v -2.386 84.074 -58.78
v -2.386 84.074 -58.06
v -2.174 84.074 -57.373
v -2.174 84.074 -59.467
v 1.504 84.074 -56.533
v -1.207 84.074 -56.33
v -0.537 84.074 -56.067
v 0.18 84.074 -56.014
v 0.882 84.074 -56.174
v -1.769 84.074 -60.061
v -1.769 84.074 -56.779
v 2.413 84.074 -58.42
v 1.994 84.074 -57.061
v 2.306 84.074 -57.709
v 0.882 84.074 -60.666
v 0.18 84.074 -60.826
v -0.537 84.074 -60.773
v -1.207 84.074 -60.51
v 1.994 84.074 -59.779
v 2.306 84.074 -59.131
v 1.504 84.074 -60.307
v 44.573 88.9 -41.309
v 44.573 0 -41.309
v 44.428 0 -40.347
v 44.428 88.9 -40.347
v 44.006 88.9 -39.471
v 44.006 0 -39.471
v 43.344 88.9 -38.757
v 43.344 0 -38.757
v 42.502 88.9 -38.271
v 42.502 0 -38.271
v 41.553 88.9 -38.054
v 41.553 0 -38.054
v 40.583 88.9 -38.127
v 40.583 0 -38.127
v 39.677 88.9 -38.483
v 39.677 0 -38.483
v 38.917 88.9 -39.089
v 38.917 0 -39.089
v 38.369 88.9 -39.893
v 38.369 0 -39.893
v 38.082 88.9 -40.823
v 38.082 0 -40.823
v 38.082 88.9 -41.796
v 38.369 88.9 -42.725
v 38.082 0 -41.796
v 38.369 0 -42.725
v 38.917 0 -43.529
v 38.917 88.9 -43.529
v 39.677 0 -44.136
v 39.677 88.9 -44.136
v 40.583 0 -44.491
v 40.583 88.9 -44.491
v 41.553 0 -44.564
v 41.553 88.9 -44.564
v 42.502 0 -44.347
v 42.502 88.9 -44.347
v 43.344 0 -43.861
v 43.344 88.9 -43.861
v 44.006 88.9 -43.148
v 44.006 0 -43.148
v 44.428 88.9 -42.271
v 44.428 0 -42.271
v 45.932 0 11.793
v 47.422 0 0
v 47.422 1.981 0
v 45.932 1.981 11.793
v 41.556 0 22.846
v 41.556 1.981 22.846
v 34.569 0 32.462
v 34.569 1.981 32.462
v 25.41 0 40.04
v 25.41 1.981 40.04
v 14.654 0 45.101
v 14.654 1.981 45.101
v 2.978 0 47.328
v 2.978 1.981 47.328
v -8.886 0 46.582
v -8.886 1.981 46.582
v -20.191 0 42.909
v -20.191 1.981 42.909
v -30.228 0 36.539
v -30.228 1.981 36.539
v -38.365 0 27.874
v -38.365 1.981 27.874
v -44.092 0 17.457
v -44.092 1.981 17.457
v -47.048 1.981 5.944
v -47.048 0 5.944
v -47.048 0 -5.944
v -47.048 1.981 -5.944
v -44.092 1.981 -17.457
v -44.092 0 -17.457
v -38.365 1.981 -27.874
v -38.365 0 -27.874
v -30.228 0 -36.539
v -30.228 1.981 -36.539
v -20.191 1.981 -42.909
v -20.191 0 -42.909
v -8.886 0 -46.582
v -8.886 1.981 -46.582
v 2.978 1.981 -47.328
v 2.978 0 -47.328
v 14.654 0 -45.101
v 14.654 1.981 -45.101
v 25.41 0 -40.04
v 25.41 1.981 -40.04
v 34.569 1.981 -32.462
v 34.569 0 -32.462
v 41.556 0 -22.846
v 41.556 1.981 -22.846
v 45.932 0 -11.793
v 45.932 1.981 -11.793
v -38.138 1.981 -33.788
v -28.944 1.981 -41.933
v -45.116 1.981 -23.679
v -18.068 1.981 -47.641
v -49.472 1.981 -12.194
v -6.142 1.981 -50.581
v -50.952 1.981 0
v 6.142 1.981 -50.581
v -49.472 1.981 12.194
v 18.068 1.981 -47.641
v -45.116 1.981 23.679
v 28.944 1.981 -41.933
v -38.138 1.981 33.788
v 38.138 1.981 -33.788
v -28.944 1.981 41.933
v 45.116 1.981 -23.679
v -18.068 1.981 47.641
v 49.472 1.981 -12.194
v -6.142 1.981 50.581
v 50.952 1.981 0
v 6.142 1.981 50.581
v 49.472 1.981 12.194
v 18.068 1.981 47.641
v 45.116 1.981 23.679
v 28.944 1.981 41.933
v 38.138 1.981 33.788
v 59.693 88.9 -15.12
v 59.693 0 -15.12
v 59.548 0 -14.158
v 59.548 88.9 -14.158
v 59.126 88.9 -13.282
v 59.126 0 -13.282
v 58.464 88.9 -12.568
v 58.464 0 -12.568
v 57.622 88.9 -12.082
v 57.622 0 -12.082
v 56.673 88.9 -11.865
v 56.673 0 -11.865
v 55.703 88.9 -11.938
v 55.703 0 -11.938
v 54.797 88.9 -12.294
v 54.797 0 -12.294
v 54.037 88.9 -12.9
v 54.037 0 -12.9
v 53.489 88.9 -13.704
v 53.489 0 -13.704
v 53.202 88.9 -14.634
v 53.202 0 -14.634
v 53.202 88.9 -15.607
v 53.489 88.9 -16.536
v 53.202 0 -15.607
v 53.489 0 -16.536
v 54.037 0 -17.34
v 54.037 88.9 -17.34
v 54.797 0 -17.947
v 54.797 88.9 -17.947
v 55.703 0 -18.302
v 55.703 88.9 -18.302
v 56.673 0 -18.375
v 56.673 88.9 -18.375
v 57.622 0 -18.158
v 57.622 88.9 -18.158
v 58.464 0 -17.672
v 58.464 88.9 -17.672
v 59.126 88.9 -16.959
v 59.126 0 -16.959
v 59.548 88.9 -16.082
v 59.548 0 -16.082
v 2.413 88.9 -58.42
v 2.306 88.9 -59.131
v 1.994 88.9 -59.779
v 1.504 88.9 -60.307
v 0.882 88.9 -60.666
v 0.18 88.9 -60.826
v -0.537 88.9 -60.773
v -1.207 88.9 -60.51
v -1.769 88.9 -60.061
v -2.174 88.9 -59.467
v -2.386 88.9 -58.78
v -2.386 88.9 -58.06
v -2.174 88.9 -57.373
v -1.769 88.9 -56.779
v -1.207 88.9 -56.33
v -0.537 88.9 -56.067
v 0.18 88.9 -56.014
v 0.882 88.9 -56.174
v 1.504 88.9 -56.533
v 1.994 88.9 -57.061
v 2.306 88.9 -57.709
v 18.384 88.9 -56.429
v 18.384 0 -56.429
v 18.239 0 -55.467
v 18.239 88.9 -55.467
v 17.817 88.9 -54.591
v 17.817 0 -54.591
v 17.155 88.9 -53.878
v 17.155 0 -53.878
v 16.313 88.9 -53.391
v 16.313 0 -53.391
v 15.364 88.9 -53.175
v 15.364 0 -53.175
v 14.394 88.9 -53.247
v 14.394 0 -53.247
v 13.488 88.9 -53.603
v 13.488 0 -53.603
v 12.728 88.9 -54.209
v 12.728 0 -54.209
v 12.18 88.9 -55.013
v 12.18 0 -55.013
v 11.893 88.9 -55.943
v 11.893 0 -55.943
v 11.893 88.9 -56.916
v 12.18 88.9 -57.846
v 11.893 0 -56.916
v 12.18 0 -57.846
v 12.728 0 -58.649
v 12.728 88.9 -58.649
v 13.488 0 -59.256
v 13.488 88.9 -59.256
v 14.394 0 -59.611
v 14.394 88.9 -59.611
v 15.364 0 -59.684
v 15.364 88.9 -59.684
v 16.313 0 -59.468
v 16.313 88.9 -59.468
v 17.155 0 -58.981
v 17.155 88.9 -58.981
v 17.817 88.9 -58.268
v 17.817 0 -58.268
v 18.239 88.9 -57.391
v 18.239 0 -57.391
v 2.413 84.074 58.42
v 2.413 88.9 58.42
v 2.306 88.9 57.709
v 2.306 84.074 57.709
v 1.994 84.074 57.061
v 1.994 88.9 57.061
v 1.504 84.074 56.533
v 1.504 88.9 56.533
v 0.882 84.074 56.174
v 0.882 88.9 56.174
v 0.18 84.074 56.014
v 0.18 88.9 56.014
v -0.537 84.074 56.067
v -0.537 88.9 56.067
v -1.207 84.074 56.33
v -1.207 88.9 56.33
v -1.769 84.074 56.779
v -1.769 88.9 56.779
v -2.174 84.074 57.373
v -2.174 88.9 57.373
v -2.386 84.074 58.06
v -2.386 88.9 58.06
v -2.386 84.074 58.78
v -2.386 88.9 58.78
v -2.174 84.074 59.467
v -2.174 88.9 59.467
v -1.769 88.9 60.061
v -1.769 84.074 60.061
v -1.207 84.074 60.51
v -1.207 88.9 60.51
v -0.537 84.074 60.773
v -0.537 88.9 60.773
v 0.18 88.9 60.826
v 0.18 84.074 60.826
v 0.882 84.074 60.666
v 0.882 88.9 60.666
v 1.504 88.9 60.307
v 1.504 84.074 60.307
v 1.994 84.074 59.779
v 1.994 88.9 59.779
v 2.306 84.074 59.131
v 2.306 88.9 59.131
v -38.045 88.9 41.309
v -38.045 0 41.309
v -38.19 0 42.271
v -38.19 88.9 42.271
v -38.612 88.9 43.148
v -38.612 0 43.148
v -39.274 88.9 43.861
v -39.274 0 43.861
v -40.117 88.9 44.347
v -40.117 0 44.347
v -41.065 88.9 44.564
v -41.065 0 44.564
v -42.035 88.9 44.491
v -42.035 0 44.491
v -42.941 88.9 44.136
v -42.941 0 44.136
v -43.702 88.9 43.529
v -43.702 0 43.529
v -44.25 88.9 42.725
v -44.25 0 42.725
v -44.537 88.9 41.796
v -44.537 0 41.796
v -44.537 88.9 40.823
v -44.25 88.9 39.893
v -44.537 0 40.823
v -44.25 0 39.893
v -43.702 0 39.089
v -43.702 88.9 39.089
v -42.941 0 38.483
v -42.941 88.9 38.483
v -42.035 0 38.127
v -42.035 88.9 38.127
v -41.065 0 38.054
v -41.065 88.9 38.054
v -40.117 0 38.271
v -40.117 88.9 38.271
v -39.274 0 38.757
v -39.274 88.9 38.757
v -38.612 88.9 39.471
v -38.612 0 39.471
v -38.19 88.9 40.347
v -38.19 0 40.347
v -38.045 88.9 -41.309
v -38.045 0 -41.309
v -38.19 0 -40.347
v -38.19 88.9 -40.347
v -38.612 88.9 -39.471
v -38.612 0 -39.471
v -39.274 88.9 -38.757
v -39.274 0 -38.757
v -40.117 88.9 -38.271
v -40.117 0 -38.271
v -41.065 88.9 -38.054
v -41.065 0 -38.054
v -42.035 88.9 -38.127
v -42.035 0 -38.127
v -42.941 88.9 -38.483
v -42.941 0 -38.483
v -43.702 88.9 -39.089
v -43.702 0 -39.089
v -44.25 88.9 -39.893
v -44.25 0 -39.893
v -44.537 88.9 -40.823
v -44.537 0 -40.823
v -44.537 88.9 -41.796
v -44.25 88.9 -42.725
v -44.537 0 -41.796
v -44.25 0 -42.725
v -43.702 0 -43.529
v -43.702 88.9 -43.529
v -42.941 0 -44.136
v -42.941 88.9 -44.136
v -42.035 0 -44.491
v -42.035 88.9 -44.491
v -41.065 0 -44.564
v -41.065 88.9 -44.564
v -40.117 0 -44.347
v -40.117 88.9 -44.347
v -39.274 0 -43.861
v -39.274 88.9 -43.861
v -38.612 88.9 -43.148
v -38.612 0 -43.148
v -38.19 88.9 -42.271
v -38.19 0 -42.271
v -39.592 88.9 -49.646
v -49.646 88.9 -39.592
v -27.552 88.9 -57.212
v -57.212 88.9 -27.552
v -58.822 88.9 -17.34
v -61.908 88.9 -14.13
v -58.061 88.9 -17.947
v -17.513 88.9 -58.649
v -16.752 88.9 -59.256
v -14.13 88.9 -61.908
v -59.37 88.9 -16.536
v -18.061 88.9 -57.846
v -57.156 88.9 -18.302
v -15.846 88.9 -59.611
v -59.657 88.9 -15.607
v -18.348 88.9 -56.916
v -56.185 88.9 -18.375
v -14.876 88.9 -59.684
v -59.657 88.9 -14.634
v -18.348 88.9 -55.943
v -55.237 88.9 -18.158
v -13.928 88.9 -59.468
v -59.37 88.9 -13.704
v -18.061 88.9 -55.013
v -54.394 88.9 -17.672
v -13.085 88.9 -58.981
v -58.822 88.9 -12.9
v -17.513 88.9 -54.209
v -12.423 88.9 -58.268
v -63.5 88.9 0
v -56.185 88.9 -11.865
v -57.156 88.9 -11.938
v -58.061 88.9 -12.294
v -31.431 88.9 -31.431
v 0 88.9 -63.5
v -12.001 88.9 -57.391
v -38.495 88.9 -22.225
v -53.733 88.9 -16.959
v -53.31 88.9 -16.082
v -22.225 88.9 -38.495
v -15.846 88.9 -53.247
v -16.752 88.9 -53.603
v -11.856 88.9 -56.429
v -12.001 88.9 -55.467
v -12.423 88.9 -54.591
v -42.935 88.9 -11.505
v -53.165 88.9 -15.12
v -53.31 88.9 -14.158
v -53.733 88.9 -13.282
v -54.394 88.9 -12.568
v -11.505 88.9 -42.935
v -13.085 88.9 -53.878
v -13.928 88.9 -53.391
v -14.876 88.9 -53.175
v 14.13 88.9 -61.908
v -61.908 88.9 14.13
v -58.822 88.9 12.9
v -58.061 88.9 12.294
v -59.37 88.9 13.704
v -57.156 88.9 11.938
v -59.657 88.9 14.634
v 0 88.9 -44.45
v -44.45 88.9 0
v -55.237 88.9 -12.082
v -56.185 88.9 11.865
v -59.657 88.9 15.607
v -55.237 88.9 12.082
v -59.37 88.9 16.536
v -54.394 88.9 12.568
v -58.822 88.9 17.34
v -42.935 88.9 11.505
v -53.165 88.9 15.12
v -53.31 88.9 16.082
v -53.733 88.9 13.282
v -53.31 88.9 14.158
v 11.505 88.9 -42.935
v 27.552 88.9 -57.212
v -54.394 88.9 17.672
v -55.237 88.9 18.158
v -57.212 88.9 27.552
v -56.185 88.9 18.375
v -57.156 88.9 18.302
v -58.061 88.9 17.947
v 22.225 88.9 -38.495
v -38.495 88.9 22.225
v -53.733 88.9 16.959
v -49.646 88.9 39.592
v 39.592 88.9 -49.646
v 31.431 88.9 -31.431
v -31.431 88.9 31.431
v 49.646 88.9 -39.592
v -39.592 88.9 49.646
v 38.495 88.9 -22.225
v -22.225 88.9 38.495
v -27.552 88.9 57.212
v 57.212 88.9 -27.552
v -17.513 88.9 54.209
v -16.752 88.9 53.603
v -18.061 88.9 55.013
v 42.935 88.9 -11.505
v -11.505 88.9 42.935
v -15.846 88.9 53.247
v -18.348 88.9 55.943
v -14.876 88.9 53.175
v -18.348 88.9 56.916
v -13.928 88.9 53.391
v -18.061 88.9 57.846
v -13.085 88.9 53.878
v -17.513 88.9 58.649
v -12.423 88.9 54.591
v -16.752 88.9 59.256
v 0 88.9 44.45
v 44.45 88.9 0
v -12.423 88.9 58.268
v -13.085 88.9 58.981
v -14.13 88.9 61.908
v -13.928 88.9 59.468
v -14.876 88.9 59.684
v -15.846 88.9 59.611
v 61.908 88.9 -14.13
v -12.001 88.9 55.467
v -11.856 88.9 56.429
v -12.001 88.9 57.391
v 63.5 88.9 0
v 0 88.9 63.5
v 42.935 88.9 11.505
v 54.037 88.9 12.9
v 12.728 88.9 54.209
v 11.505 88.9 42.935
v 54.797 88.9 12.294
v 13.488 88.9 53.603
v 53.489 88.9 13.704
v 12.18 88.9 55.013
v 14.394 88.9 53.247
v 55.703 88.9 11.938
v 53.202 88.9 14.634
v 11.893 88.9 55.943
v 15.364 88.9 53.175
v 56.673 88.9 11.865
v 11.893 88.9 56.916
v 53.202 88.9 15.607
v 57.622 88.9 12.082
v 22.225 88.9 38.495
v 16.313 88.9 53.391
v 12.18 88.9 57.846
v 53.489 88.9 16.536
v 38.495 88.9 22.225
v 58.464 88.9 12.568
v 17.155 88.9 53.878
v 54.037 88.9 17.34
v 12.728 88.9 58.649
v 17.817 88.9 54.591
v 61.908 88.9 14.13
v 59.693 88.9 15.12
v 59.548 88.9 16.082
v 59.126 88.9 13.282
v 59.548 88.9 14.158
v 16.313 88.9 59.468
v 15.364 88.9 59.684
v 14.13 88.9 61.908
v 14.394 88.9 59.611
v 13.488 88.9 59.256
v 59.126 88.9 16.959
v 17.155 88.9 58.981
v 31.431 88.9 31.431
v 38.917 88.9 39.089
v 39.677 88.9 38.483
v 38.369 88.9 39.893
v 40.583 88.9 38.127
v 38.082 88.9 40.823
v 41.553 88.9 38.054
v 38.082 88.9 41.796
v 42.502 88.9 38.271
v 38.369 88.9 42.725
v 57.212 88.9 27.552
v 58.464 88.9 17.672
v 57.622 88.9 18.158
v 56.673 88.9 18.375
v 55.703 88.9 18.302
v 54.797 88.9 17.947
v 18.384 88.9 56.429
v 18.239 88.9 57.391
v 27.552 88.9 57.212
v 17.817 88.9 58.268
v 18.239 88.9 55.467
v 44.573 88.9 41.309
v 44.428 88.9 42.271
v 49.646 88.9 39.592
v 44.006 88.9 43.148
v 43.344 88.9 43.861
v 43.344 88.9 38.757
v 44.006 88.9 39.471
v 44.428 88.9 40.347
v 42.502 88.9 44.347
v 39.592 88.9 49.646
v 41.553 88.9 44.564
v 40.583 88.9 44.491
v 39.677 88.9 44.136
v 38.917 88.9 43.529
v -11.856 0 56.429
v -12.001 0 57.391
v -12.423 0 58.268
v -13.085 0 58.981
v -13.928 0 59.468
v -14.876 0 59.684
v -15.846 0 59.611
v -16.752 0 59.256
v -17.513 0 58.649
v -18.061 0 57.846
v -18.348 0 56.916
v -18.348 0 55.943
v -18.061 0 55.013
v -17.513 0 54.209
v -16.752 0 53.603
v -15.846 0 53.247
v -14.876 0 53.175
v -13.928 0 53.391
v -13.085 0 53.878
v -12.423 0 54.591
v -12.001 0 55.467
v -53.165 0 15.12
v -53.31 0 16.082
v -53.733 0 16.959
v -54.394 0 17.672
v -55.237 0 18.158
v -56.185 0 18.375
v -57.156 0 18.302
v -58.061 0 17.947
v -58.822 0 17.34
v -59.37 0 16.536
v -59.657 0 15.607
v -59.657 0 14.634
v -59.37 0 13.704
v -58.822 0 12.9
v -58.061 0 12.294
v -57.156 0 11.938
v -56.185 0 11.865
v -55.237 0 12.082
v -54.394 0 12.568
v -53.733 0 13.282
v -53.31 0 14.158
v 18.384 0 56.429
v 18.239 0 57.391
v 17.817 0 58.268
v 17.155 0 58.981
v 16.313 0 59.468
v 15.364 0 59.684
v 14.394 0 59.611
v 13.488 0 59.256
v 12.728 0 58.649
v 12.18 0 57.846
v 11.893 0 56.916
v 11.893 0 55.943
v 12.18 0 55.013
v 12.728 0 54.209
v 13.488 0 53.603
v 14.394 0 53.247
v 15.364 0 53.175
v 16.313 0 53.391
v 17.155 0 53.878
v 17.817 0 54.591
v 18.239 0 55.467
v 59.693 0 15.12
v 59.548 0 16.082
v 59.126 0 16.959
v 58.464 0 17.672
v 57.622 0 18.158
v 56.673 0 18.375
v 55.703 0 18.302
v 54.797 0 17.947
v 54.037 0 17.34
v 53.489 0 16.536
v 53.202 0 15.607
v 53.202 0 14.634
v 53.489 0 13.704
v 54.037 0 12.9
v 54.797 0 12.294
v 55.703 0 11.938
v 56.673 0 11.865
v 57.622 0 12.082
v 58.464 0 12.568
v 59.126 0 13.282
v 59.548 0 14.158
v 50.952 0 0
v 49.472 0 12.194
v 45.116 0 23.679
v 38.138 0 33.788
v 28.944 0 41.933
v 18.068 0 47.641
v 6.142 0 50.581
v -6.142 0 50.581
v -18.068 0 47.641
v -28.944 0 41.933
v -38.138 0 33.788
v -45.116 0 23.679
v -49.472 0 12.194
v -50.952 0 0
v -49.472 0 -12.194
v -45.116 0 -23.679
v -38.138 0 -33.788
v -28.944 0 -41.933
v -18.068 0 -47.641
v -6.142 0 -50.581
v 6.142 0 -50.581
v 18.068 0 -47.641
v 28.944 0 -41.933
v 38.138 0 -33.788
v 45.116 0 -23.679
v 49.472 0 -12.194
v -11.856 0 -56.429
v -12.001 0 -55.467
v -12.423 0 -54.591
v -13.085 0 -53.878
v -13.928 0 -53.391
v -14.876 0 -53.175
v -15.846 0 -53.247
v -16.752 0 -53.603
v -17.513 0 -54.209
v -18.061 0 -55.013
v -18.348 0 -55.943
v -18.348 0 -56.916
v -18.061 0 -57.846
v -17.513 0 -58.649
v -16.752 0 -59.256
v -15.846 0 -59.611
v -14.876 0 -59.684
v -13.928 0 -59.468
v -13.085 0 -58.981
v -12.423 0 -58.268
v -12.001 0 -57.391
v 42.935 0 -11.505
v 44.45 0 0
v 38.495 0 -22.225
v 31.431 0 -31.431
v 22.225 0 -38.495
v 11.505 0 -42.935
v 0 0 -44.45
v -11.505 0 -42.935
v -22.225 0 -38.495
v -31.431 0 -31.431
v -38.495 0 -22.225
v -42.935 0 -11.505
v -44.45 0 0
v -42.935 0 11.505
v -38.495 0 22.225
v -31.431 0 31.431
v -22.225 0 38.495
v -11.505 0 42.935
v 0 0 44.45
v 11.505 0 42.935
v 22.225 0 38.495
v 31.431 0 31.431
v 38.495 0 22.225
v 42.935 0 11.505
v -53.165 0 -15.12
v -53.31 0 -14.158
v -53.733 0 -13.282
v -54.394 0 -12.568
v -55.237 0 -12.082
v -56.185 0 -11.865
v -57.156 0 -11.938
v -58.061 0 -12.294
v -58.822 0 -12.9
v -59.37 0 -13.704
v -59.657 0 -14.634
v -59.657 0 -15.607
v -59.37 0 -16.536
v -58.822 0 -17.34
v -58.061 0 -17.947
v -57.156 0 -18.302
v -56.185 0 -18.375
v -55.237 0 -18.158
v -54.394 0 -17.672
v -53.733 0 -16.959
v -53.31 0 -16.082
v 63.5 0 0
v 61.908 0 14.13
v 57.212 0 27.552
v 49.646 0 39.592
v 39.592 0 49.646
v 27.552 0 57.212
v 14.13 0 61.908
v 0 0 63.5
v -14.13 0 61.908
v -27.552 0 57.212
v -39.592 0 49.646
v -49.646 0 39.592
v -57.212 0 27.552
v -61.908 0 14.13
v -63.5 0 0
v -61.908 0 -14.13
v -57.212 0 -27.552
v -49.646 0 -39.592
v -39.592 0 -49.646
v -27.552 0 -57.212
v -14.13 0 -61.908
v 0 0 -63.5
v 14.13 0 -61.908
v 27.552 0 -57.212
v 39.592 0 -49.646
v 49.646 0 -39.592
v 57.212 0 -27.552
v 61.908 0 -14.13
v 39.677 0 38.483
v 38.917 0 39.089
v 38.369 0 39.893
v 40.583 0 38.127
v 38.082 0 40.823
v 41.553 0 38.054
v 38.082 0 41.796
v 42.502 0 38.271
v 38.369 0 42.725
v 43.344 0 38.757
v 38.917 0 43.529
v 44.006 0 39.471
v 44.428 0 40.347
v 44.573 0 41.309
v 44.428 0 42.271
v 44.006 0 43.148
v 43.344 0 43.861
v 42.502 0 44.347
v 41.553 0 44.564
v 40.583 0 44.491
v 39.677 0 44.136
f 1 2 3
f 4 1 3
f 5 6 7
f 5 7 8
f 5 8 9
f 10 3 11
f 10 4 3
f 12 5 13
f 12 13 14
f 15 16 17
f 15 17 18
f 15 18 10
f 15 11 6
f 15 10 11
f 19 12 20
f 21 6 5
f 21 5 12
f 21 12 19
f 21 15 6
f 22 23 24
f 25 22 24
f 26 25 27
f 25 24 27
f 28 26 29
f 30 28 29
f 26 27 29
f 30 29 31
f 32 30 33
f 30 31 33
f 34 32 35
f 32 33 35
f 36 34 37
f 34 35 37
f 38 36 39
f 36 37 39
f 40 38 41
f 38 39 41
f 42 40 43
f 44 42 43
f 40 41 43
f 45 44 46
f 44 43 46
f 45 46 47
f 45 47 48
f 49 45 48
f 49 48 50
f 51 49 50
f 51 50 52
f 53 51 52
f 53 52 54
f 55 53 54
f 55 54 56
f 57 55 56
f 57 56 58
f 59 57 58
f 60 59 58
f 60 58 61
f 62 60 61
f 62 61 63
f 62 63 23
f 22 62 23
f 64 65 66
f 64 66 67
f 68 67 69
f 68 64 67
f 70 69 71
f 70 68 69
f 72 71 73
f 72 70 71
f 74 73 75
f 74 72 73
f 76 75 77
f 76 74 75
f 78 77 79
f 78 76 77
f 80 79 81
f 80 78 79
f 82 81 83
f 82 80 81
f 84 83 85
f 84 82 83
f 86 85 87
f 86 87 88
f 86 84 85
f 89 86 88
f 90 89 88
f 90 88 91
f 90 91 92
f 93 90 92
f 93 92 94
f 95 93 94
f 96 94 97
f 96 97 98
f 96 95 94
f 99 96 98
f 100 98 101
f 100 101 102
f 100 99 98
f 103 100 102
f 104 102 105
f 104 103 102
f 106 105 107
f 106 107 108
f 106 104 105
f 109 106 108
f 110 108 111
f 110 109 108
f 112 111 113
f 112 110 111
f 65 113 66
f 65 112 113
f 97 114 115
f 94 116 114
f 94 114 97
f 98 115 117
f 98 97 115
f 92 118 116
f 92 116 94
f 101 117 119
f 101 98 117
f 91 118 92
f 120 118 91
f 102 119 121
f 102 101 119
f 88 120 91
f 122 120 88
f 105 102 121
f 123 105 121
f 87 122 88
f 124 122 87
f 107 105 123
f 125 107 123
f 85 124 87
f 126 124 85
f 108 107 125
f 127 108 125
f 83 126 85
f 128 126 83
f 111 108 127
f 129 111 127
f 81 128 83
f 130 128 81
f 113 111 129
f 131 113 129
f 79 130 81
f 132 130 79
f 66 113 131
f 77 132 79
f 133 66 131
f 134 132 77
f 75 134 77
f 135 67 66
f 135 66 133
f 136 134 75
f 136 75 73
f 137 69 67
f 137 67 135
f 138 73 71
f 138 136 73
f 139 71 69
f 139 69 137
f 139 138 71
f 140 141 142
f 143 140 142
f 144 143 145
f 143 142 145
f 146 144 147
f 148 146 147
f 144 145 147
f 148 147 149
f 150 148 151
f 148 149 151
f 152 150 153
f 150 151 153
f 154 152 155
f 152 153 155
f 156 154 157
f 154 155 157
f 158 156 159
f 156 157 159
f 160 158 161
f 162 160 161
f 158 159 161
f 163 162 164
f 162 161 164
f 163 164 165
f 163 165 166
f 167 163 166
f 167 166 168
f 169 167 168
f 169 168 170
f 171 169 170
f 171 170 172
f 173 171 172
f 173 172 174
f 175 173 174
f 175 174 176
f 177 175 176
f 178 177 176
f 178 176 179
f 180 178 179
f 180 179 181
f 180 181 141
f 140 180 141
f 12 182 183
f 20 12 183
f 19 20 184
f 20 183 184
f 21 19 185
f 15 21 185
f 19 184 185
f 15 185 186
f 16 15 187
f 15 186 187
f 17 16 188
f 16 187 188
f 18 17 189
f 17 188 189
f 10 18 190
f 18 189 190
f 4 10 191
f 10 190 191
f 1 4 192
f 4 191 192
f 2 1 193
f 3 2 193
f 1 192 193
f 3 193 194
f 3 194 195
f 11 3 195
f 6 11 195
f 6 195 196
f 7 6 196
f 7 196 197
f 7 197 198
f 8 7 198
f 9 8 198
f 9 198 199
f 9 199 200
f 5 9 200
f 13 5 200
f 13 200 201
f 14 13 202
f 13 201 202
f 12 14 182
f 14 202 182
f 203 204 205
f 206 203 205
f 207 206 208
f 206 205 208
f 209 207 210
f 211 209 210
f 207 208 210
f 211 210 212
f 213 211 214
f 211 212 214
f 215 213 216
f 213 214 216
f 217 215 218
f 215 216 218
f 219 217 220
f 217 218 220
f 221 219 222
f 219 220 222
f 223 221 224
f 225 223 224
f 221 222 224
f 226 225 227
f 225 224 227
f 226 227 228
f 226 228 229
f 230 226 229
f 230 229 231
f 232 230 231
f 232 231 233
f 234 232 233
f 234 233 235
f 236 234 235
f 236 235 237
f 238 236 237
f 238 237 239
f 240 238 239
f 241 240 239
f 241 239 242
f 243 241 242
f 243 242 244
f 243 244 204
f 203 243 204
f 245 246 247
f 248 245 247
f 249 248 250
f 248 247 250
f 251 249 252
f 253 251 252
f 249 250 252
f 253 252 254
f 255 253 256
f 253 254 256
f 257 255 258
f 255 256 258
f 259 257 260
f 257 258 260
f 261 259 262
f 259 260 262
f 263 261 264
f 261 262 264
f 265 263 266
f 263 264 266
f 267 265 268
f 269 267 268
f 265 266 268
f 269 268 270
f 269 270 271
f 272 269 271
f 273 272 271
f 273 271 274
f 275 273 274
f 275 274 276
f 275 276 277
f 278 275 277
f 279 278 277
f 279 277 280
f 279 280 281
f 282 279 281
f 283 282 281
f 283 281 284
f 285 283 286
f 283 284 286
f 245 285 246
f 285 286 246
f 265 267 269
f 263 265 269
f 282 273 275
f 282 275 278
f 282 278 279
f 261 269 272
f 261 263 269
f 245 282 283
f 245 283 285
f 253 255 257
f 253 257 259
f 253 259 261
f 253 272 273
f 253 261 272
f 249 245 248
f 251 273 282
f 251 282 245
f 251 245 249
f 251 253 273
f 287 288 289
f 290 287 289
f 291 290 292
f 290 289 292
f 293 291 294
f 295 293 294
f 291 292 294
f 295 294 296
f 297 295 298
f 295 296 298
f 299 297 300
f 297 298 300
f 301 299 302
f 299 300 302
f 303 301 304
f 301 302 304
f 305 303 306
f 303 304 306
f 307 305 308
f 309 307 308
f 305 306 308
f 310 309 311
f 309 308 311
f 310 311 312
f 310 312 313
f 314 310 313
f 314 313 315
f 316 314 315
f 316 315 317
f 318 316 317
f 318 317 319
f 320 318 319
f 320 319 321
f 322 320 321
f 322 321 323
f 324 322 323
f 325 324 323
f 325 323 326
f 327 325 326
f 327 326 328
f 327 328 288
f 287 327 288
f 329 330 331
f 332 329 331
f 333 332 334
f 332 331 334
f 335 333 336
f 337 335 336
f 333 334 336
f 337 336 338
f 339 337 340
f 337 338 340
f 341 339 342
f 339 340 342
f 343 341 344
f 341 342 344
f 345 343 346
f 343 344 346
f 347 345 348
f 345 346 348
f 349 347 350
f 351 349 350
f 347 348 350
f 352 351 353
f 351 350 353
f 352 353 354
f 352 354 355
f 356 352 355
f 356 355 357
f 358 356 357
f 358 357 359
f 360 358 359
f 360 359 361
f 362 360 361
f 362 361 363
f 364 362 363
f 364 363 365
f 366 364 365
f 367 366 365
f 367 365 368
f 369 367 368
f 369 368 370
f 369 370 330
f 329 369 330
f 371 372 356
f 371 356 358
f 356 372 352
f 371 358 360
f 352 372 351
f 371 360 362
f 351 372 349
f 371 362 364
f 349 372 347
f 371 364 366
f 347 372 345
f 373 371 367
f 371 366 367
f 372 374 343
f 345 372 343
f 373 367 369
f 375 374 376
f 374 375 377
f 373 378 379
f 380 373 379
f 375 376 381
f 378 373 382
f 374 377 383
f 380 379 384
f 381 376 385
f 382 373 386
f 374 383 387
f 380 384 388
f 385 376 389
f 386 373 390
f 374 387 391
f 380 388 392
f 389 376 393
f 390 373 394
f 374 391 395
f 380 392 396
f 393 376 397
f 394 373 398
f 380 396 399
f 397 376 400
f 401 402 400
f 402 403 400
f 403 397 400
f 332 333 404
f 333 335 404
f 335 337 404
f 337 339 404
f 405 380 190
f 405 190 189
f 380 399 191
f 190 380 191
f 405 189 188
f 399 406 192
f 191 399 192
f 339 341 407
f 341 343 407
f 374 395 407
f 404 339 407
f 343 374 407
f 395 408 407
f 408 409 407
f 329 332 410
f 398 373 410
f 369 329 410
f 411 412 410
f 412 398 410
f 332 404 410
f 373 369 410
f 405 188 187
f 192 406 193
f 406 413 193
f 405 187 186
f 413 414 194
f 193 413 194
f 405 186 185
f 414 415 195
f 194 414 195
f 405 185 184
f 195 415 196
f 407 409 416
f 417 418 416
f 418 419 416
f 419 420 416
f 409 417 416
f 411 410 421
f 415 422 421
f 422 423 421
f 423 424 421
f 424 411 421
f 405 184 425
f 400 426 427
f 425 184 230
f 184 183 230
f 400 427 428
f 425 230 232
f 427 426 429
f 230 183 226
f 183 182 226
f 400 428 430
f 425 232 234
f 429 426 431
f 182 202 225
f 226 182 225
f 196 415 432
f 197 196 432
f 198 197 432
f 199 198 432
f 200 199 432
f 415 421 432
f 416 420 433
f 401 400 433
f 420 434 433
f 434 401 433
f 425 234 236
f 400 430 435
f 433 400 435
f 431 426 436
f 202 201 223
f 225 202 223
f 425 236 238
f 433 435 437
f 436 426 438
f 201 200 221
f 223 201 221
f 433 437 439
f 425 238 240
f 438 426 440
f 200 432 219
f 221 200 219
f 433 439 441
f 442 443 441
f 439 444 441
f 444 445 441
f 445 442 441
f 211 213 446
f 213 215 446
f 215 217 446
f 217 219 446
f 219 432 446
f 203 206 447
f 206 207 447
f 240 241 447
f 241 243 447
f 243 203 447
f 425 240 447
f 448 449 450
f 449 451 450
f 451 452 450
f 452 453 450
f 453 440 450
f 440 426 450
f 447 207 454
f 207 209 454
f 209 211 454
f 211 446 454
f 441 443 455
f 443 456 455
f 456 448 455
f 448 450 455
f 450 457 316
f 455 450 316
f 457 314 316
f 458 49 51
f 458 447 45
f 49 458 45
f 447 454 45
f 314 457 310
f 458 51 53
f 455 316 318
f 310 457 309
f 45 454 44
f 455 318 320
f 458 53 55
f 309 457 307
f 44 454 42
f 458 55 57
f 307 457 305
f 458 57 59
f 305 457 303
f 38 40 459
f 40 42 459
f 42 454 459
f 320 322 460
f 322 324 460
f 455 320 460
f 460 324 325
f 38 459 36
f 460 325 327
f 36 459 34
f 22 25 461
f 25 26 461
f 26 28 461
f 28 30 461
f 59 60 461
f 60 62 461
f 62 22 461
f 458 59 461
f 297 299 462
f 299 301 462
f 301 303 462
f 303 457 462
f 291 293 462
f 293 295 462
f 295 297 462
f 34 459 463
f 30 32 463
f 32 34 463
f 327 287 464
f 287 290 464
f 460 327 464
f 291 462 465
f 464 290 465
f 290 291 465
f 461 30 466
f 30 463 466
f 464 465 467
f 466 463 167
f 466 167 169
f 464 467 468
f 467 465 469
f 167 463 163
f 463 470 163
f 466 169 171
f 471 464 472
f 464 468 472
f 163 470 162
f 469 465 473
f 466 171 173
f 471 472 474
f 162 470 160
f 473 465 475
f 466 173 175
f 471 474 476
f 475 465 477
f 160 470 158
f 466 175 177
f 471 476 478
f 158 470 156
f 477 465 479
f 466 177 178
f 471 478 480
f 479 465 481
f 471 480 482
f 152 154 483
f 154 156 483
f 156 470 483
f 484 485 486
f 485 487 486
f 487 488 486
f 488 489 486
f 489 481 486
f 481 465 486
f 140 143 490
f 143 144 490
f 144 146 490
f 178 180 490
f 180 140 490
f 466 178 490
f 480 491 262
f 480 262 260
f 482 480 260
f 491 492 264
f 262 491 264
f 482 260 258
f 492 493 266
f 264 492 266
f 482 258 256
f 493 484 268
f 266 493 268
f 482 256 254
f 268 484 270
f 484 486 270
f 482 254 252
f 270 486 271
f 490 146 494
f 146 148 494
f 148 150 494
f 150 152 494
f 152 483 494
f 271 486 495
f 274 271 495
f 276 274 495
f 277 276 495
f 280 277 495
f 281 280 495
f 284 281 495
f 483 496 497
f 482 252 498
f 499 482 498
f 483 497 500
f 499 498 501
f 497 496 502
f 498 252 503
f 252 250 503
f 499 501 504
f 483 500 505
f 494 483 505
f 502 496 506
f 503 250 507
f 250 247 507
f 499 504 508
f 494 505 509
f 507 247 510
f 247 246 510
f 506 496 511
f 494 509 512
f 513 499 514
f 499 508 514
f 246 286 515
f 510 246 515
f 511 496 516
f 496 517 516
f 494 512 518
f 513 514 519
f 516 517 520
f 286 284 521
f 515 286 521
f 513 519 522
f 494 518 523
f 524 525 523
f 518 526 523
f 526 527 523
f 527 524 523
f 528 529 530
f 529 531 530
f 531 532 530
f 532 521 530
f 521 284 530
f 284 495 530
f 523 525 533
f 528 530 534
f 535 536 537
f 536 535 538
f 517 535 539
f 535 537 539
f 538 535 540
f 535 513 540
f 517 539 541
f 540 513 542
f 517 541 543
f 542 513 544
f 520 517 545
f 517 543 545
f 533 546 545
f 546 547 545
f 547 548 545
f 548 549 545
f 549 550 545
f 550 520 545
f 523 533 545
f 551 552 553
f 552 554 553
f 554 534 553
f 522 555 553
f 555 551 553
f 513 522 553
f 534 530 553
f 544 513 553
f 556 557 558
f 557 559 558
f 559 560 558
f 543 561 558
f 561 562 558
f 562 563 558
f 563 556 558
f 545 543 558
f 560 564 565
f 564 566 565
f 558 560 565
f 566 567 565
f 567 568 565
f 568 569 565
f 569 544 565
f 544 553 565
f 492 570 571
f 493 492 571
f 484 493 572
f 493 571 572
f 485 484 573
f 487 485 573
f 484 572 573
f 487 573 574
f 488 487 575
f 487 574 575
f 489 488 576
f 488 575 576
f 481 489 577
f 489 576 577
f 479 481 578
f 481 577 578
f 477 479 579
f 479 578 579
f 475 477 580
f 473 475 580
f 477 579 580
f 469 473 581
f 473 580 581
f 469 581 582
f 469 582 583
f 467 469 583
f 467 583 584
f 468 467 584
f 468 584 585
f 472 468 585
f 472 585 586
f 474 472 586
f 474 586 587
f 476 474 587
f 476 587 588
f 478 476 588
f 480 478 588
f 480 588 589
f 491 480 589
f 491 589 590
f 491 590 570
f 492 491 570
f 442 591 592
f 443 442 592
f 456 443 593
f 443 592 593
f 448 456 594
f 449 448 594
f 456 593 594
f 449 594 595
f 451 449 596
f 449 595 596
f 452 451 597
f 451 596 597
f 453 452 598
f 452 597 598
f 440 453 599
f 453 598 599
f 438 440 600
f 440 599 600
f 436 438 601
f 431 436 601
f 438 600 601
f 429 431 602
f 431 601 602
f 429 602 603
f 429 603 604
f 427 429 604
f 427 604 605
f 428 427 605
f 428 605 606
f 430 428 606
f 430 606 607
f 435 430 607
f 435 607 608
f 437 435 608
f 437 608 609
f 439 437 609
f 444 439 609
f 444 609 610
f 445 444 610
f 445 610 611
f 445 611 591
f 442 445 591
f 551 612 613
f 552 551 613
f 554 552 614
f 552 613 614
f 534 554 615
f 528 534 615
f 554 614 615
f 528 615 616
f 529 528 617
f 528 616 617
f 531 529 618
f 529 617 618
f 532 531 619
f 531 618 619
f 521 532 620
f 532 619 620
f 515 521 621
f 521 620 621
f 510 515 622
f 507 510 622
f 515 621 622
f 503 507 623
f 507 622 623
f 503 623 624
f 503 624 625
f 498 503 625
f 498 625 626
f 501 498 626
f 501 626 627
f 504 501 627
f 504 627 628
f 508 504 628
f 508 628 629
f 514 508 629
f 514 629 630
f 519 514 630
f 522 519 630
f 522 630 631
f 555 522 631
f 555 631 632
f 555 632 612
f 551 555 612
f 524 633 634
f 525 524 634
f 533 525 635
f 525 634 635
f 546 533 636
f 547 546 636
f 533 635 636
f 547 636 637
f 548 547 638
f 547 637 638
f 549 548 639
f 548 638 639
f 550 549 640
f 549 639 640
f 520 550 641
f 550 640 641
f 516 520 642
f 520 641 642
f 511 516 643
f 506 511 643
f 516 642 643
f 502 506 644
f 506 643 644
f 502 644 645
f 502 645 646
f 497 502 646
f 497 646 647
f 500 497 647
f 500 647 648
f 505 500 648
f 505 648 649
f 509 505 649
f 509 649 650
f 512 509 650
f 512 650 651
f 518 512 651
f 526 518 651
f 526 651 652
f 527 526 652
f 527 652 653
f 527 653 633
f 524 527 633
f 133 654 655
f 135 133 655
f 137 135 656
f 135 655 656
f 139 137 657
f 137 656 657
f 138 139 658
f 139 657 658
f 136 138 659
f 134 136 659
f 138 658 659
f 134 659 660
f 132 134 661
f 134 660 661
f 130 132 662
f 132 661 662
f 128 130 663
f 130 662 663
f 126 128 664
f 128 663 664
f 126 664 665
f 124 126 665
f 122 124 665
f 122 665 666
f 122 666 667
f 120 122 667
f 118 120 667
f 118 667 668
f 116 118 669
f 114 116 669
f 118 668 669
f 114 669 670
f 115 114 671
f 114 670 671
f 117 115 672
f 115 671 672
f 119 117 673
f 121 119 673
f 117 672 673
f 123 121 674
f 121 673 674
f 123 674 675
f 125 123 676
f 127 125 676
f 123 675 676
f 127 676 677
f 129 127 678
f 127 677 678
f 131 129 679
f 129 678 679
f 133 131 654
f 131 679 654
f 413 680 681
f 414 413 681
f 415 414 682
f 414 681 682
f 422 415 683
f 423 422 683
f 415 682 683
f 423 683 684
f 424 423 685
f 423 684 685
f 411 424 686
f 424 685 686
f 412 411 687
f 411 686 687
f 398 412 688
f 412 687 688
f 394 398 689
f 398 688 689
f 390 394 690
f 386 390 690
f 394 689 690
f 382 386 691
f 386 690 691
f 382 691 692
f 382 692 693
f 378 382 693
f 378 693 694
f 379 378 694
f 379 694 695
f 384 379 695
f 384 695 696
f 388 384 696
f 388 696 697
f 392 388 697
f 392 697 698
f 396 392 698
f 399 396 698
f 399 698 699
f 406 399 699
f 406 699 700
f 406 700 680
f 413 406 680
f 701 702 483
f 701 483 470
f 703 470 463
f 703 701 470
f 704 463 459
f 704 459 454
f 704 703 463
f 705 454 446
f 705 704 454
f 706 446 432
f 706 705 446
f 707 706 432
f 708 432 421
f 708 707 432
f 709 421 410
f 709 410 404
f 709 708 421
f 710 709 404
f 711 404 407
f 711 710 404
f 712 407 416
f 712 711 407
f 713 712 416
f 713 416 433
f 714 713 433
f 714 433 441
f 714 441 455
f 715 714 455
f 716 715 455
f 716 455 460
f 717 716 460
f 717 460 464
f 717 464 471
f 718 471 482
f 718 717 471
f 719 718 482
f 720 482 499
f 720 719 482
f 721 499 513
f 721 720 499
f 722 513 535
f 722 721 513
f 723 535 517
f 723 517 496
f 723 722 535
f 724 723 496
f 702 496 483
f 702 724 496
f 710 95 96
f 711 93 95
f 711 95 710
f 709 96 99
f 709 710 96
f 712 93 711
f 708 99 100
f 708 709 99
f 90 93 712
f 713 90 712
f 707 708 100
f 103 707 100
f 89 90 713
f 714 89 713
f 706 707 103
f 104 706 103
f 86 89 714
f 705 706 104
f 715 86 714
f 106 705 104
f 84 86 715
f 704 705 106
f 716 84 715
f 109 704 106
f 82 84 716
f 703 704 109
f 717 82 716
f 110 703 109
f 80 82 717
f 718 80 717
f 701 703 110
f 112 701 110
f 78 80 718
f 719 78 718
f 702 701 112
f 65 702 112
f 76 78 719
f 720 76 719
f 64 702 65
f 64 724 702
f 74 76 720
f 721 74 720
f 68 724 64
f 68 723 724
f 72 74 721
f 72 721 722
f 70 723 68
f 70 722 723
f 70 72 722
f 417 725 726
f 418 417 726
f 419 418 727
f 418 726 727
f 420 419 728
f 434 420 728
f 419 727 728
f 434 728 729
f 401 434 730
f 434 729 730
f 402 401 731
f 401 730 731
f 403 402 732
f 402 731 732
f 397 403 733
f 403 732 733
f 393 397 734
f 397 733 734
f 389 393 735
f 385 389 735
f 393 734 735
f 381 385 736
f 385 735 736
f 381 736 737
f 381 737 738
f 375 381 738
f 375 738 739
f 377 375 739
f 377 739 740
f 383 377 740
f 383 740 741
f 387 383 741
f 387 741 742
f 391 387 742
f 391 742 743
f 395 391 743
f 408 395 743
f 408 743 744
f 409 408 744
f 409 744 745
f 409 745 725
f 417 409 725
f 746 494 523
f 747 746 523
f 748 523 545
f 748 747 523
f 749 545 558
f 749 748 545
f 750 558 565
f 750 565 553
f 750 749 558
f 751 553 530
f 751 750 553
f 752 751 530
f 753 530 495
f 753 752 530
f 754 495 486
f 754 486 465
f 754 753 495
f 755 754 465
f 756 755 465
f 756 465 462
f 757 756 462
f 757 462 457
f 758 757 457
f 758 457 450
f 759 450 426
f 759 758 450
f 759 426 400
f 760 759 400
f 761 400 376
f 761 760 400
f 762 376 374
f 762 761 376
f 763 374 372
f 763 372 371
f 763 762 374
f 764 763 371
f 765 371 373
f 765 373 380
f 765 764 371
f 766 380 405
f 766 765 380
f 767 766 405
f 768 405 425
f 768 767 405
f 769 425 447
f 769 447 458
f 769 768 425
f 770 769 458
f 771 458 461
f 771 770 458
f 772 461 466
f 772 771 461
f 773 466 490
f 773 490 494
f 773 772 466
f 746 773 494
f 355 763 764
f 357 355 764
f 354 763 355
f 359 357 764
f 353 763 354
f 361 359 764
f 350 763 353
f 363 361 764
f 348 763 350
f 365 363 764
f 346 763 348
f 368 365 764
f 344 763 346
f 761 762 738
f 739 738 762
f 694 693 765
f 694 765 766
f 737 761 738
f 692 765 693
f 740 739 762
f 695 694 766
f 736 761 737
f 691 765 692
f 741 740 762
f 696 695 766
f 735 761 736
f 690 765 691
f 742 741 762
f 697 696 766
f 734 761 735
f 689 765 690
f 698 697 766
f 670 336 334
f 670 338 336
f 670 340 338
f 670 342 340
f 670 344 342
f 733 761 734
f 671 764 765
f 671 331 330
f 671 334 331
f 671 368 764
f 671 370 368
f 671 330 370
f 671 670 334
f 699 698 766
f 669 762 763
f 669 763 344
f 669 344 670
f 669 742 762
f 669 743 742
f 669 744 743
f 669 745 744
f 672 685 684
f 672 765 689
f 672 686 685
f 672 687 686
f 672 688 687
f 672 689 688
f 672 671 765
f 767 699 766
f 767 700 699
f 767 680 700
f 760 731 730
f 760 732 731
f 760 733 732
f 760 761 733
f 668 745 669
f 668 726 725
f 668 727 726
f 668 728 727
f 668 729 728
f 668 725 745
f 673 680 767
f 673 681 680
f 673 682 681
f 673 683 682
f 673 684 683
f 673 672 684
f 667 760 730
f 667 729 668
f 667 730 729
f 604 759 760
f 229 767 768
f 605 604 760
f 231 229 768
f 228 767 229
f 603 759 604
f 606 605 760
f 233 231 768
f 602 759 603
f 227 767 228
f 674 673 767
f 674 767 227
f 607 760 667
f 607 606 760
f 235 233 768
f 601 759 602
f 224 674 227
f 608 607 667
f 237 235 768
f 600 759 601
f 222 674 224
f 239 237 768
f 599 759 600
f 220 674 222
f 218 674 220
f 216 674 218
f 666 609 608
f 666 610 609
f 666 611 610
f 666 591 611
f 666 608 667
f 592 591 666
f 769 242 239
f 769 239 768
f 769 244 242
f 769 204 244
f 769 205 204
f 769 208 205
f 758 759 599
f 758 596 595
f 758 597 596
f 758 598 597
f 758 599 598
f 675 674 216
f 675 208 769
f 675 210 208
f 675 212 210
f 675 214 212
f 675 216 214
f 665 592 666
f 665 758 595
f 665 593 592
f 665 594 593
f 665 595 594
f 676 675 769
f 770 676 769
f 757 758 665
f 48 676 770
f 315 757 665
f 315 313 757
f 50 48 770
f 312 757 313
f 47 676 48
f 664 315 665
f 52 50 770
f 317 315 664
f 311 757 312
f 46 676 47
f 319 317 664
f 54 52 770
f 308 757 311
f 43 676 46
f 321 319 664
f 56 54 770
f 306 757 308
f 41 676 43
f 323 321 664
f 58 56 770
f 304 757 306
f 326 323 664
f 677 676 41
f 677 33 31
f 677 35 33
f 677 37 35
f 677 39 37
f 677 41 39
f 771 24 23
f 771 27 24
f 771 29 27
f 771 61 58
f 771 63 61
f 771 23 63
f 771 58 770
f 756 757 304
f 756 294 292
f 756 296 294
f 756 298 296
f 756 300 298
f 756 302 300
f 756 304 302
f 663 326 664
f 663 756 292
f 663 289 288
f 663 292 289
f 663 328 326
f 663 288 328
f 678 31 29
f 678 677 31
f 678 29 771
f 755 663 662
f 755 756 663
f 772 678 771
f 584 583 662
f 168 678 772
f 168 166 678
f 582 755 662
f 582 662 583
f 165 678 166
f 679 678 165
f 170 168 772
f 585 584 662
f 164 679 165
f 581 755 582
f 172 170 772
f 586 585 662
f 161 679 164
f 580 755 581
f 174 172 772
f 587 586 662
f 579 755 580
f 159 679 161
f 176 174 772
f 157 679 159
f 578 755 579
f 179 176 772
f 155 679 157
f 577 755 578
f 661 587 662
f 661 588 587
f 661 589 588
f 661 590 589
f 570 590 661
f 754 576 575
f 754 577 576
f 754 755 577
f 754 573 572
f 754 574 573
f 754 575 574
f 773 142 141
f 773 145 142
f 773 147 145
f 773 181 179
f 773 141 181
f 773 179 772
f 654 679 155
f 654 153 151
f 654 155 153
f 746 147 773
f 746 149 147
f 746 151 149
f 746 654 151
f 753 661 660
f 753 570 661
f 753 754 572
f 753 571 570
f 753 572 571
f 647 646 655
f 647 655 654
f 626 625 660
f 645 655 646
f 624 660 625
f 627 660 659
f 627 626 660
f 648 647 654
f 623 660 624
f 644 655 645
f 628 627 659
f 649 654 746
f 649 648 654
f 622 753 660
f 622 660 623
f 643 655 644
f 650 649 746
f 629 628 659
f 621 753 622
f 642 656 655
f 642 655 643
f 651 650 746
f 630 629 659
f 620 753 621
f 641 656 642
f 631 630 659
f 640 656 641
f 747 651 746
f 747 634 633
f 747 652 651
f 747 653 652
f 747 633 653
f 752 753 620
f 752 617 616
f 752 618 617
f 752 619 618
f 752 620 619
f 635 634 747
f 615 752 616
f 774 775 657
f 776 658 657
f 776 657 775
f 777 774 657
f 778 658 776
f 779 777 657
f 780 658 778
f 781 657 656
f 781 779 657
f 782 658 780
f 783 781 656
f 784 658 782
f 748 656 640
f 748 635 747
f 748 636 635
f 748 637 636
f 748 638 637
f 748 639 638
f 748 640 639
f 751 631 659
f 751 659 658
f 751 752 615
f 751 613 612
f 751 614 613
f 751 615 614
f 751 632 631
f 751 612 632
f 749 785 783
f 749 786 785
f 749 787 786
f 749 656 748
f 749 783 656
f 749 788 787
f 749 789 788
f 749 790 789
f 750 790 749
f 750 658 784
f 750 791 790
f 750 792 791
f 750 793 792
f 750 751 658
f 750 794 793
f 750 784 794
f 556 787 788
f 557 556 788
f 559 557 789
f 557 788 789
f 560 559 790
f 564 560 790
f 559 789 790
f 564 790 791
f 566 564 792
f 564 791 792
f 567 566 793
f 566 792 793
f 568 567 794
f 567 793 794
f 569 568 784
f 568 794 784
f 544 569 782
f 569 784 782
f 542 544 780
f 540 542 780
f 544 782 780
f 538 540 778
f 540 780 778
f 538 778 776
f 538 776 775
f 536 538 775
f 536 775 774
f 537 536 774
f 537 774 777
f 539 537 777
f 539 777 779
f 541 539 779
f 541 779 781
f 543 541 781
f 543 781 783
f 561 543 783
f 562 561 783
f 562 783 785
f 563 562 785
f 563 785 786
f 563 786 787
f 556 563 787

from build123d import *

# Parameters (mm, degrees)
SKETCH2_R               = 55.88
SKETCH2_R_2             = 44.45
BASE_CYLINDER_DEPTH     = 88.9
SKETCH3_R               = 63.5
SKETCH3_R_2             = 44.45
AFT_FLANGE_DEPTH        = 88.9
SKETCH6_R               = 50.9524
SKETCH6_R_2             = 47.4218
AFT_O_RING_DEPTH        = 1.9812
SKETCH_FOR_BOLT_HOLES_R = 3.2639
CUT_EXTRUDE1_DEPTH      = 89.9
SKETCH51_R              = 2.413
CUT_EXTRUDE2_DEPTH      = 4.826


with BuildPart() as part:
    # Sketch2 → Base Cylinder (new body)
    with BuildSketch(Plane(origin=(0, 0, 0), x_dir=(1, 0, 0), z_dir=(0, 1, 0))):
        Circle(SKETCH2_R)
        Circle(SKETCH2_R_2, mode=Mode.SUBTRACT)
    extrude(amount=BASE_CYLINDER_DEPTH)

    # Sketch3 → Aft Flange (add)
    with BuildSketch(Plane.XZ):
        Circle(SKETCH3_R)
        Circle(SKETCH3_R_2, mode=Mode.SUBTRACT)
    extrude(amount=-AFT_FLANGE_DEPTH)

    # Sketch6 → Aft O-Ring (cut)
    with BuildSketch(Plane.XZ):
        Circle(SKETCH6_R)
        Circle(SKETCH6_R_2, mode=Mode.SUBTRACT)
    extrude(amount=-AFT_O_RING_DEPTH, mode=Mode.SUBTRACT)

    # Sketch For Bolt Holes → Cut-Extrude1 (cut, through all)
    with BuildSketch(Plane.XZ):
        with Locations((15.120208615, 56.429386772)):
            Circle(SKETCH_FOR_BOLT_HOLES_R)
        with Locations((41.309178157, 41.309178157)):
            Circle(SKETCH_FOR_BOLT_HOLES_R)
        with Locations((56.429386772, 15.120208615)):
            Circle(SKETCH_FOR_BOLT_HOLES_R)
        with Locations((56.429386772, -15.120208615)):
            Circle(SKETCH_FOR_BOLT_HOLES_R)
        with Locations((41.309178157, -41.309178157)):
            Circle(SKETCH_FOR_BOLT_HOLES_R)
        with Locations((15.120208615, -56.429386772)):
            Circle(SKETCH_FOR_BOLT_HOLES_R)
        with Locations((-15.120208615, -56.429386772)):
            Circle(SKETCH_FOR_BOLT_HOLES_R)
        with Locations((-41.309178157, -41.309178157)):
            Circle(SKETCH_FOR_BOLT_HOLES_R)
        with Locations((-56.429386772, -15.120208615)):
            Circle(SKETCH_FOR_BOLT_HOLES_R)
        with Locations((-56.429386772, 15.120208615)):
            Circle(SKETCH_FOR_BOLT_HOLES_R)
        with Locations((-41.309178157, 41.309178157)):
            Circle(SKETCH_FOR_BOLT_HOLES_R)
        with Locations((-15.120208615, 56.429386772)):
            Circle(SKETCH_FOR_BOLT_HOLES_R)
    extrude(amount=-CUT_EXTRUDE1_DEPTH, mode=Mode.SUBTRACT)

    # Sketch51 → Cut-Extrude2 (cut)
    with BuildSketch(Plane(origin=(0, 88.9, 0), x_dir=(1, 0, 0), z_dir=(0, 1, 0))):
        with Locations((0, 58.42)):
            Circle(SKETCH51_R)
        with Locations((0, -58.42)):
            Circle(SKETCH51_R)
    extrude(amount=-CUT_EXTRUDE2_DEPTH, mode=Mode.SUBTRACT)


solid = part.part
